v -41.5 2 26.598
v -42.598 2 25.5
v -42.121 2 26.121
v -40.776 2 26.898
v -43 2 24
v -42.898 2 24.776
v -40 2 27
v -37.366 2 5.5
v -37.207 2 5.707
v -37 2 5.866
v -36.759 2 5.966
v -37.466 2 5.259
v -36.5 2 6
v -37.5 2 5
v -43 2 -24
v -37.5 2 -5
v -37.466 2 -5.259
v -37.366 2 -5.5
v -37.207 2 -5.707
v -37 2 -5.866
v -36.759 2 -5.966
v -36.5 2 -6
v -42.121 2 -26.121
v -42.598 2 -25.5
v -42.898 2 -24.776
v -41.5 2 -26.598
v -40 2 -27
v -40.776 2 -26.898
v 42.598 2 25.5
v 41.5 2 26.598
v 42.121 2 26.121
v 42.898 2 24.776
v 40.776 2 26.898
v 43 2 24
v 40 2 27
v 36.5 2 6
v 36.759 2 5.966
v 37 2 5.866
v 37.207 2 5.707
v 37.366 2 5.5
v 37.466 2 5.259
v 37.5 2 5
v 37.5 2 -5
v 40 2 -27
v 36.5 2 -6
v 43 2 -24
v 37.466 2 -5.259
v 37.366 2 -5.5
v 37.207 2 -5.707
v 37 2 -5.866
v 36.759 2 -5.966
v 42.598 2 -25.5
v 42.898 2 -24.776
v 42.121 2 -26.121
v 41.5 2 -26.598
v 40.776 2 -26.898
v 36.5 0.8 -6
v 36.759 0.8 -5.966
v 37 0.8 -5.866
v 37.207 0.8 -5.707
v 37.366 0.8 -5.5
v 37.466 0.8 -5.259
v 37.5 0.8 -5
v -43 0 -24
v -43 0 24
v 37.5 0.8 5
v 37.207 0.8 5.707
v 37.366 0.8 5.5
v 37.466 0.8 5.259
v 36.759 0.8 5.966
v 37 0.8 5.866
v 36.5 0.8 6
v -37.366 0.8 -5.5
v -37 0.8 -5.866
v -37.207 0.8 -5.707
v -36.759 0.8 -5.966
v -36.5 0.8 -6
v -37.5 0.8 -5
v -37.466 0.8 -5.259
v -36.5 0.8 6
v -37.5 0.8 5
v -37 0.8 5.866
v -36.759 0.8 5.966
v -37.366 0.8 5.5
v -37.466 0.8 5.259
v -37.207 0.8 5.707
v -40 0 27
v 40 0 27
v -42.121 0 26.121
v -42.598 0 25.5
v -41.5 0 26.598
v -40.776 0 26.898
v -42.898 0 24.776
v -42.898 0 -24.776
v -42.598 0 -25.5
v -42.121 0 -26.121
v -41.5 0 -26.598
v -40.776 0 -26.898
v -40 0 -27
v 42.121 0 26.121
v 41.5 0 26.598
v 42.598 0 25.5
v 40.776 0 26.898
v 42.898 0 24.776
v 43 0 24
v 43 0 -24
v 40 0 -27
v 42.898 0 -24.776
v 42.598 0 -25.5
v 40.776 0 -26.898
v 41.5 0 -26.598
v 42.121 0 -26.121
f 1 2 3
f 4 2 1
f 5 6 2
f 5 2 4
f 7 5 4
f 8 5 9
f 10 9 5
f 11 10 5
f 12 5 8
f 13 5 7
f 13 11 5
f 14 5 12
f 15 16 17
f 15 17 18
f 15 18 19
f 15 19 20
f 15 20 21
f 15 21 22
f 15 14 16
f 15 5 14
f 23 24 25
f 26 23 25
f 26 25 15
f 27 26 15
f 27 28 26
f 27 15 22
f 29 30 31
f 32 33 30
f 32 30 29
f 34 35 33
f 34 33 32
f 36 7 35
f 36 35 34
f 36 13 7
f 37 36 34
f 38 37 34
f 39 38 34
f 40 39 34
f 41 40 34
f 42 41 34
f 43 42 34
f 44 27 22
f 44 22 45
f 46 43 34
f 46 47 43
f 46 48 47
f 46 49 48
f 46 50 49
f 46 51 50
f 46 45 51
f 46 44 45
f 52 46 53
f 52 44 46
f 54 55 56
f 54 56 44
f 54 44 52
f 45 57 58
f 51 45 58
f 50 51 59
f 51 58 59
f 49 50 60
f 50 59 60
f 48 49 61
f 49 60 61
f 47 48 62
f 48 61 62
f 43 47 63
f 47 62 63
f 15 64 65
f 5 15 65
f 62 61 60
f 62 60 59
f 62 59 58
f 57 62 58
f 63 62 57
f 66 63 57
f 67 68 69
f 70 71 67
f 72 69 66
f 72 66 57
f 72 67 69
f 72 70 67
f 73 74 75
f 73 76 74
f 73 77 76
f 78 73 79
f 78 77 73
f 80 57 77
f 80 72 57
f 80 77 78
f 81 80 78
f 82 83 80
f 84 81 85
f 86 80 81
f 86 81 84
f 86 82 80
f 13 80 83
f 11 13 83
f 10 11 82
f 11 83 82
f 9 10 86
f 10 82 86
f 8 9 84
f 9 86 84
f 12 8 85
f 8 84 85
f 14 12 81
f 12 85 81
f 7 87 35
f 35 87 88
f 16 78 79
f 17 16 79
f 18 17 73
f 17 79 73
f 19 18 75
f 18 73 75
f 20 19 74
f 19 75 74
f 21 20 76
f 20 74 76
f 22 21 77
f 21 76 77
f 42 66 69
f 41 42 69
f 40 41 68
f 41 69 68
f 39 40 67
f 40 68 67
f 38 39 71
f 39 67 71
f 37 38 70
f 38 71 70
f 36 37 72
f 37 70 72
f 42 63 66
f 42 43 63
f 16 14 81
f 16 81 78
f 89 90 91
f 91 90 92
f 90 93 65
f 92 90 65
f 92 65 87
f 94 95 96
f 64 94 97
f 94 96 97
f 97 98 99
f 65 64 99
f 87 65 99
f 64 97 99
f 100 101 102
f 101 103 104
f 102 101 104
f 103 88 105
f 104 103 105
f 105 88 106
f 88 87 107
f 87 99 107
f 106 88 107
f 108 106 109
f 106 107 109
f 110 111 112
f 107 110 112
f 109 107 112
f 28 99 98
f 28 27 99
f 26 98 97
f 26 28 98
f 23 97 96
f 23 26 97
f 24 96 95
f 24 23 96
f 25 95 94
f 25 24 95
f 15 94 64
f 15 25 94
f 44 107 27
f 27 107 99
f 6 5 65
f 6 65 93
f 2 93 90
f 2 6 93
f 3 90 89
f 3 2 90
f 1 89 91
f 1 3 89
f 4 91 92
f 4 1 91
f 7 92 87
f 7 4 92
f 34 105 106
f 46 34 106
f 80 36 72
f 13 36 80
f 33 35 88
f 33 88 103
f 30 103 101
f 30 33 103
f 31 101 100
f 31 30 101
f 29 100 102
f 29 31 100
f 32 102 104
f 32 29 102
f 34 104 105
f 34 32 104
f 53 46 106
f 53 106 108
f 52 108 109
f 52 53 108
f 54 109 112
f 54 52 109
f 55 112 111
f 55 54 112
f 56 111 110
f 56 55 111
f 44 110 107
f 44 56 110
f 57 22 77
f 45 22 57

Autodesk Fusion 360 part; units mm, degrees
sketch "Skizze1" plane through (0, 0, 0) normal (0, 1, 0) x (1, 0, 0)
  line L0 (43, 27) -> (-43, 27)
  line L1 (-43, 27) -> (-43, -27)
  line L2 (-43, -27) -> (43, -27)
  line L3 (43, -27) -> (43, 27)
  line L4 (43, 27) -> (-43, -27) construction
  line L5 (-43, 27) -> (43, -27) construction
  dimension "d1" = 54
  dimension "d2" = 86
extrude "Extrusion1" add sketch "Skizze1" along normal blind 2
fillet "Abrundung1" radius 3 4 edges at (43, 1, -27) (43, 1, 27) (-43, 1, 27) (-43, 1, -27)
sketch "Skizze2" plane through (0, 2, 0) normal (0, 1, 0) x (-1, 0, 0)
  arc A0 (40, -27) -> (43, -24) centre (40, -24) ccw
  line L0 (43, -24) -> (43, 24)
  arc A1 (43, 24) -> (40, 27) centre (40, 24) ccw
  line L1 (40, 27) -> (-40, 27)
  arc A2 (-40, 27) -> (-43, 24) centre (-40, 24) ccw
  line L2 (-43, 24) -> (-43, -24)
  arc A3 (-43, -24) -> (-40, -27) centre (-40, -24) ccw
  line L3 (-40, -27) -> (40, -27)
  line L4 (37.5, -6) -> (-37.5, -6)
  line L5 (-37.5, -6) -> (-37.5, 6)
  line L6 (-37.5, 6) -> (37.5, 6)
  line L7 (37.5, 6) -> (37.5, -6)
  line L8 (37.5, -6) -> (-37.5, 6) construction
  line L9 (-37.5, -6) -> (37.5, 6) construction
  dimension "d7" = 12
  dimension "d8" = 75
extrude "Extrusion2" cut sketch "Skizze2" against normal blind 1.2 contours L4 L5 L6 L7
fillet "Abrundung2" radius 1 4 edges at (37.5, 1.4, -6) (37.5, 1.4, 6) (-37.5, 1.4, -6) (-37.5, 1.4, 6)
